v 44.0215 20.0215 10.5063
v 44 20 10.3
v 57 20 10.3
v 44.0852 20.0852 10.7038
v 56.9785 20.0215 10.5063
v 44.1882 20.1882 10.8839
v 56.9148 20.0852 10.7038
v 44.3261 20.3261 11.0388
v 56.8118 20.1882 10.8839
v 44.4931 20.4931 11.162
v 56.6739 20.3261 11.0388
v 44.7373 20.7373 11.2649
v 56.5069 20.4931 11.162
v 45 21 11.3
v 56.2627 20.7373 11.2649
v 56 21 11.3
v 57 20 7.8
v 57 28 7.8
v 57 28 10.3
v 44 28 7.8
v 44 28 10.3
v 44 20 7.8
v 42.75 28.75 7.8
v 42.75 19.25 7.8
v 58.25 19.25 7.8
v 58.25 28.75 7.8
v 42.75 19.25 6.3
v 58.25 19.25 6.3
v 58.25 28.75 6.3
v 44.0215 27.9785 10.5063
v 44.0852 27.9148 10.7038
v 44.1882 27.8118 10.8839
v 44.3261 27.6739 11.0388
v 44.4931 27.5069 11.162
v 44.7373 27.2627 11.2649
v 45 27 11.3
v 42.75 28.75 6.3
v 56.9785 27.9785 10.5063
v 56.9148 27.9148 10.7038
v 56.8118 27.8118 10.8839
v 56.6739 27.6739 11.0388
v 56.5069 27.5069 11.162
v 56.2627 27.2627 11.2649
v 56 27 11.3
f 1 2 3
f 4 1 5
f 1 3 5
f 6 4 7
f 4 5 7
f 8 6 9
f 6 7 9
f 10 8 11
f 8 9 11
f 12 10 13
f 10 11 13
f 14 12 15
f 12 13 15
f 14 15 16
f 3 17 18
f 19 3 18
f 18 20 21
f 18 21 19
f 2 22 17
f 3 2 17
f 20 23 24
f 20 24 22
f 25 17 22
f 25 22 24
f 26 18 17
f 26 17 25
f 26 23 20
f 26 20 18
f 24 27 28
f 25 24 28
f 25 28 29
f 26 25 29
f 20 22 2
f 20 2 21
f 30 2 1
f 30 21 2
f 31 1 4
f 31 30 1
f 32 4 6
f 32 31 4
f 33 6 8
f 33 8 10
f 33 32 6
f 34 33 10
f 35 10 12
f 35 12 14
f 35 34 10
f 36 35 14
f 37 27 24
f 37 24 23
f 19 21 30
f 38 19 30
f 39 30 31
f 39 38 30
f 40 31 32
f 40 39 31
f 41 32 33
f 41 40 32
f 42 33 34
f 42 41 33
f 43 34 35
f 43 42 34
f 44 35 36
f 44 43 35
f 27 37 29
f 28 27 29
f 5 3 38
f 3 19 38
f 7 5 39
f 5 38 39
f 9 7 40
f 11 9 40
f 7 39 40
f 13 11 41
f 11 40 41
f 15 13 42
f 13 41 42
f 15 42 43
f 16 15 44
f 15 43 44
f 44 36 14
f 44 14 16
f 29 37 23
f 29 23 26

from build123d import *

# Parameters (mm, degrees)
BOX201_W     = 13
BOX201_H     = 8
BOX201_DEPTH = 5
FILLET048_R  = 1
BOX203_W     = 15.5
BOX203_H     = 9.5
BOX203_DEPTH = 1.5


with BuildPart() as fillet048:
    # Box201 → Box201 (new body)
    with BuildSketch(Plane(origin=(44, 20, 6.3), x_dir=(1, 0, 0), z_dir=(0, 0, 1))):
        with Locations((6.5, 4)):
            Rectangle(BOX201_W, BOX201_H)
    extrude(amount=BOX201_DEPTH)

    # Fillet048
    fillet048_edges = [fillet048.edges().sort_by_distance(p)[0] for p in [
        (44, 24, 11.3),
        (57, 24, 11.3),
        (50.5, 20, 11.3),
        (50.5, 28, 11.3),
    ]]
    fillet(fillet048_edges, radius=FILLET048_R)


with BuildPart() as fusion062:
    # Box203 → Box203 (new body)
    with BuildSketch(Plane(origin=(42.75, 19.25, 6.3), x_dir=(1, 0, 0), z_dir=(0, 0, 1))):
        with Locations((7.75, 4.75)):
            Rectangle(BOX203_W, BOX203_H)
    extrude(amount=BOX203_DEPTH)

    # Fusion062: union Fillet048
    add(fillet048.part)


solid = fusion062.part
